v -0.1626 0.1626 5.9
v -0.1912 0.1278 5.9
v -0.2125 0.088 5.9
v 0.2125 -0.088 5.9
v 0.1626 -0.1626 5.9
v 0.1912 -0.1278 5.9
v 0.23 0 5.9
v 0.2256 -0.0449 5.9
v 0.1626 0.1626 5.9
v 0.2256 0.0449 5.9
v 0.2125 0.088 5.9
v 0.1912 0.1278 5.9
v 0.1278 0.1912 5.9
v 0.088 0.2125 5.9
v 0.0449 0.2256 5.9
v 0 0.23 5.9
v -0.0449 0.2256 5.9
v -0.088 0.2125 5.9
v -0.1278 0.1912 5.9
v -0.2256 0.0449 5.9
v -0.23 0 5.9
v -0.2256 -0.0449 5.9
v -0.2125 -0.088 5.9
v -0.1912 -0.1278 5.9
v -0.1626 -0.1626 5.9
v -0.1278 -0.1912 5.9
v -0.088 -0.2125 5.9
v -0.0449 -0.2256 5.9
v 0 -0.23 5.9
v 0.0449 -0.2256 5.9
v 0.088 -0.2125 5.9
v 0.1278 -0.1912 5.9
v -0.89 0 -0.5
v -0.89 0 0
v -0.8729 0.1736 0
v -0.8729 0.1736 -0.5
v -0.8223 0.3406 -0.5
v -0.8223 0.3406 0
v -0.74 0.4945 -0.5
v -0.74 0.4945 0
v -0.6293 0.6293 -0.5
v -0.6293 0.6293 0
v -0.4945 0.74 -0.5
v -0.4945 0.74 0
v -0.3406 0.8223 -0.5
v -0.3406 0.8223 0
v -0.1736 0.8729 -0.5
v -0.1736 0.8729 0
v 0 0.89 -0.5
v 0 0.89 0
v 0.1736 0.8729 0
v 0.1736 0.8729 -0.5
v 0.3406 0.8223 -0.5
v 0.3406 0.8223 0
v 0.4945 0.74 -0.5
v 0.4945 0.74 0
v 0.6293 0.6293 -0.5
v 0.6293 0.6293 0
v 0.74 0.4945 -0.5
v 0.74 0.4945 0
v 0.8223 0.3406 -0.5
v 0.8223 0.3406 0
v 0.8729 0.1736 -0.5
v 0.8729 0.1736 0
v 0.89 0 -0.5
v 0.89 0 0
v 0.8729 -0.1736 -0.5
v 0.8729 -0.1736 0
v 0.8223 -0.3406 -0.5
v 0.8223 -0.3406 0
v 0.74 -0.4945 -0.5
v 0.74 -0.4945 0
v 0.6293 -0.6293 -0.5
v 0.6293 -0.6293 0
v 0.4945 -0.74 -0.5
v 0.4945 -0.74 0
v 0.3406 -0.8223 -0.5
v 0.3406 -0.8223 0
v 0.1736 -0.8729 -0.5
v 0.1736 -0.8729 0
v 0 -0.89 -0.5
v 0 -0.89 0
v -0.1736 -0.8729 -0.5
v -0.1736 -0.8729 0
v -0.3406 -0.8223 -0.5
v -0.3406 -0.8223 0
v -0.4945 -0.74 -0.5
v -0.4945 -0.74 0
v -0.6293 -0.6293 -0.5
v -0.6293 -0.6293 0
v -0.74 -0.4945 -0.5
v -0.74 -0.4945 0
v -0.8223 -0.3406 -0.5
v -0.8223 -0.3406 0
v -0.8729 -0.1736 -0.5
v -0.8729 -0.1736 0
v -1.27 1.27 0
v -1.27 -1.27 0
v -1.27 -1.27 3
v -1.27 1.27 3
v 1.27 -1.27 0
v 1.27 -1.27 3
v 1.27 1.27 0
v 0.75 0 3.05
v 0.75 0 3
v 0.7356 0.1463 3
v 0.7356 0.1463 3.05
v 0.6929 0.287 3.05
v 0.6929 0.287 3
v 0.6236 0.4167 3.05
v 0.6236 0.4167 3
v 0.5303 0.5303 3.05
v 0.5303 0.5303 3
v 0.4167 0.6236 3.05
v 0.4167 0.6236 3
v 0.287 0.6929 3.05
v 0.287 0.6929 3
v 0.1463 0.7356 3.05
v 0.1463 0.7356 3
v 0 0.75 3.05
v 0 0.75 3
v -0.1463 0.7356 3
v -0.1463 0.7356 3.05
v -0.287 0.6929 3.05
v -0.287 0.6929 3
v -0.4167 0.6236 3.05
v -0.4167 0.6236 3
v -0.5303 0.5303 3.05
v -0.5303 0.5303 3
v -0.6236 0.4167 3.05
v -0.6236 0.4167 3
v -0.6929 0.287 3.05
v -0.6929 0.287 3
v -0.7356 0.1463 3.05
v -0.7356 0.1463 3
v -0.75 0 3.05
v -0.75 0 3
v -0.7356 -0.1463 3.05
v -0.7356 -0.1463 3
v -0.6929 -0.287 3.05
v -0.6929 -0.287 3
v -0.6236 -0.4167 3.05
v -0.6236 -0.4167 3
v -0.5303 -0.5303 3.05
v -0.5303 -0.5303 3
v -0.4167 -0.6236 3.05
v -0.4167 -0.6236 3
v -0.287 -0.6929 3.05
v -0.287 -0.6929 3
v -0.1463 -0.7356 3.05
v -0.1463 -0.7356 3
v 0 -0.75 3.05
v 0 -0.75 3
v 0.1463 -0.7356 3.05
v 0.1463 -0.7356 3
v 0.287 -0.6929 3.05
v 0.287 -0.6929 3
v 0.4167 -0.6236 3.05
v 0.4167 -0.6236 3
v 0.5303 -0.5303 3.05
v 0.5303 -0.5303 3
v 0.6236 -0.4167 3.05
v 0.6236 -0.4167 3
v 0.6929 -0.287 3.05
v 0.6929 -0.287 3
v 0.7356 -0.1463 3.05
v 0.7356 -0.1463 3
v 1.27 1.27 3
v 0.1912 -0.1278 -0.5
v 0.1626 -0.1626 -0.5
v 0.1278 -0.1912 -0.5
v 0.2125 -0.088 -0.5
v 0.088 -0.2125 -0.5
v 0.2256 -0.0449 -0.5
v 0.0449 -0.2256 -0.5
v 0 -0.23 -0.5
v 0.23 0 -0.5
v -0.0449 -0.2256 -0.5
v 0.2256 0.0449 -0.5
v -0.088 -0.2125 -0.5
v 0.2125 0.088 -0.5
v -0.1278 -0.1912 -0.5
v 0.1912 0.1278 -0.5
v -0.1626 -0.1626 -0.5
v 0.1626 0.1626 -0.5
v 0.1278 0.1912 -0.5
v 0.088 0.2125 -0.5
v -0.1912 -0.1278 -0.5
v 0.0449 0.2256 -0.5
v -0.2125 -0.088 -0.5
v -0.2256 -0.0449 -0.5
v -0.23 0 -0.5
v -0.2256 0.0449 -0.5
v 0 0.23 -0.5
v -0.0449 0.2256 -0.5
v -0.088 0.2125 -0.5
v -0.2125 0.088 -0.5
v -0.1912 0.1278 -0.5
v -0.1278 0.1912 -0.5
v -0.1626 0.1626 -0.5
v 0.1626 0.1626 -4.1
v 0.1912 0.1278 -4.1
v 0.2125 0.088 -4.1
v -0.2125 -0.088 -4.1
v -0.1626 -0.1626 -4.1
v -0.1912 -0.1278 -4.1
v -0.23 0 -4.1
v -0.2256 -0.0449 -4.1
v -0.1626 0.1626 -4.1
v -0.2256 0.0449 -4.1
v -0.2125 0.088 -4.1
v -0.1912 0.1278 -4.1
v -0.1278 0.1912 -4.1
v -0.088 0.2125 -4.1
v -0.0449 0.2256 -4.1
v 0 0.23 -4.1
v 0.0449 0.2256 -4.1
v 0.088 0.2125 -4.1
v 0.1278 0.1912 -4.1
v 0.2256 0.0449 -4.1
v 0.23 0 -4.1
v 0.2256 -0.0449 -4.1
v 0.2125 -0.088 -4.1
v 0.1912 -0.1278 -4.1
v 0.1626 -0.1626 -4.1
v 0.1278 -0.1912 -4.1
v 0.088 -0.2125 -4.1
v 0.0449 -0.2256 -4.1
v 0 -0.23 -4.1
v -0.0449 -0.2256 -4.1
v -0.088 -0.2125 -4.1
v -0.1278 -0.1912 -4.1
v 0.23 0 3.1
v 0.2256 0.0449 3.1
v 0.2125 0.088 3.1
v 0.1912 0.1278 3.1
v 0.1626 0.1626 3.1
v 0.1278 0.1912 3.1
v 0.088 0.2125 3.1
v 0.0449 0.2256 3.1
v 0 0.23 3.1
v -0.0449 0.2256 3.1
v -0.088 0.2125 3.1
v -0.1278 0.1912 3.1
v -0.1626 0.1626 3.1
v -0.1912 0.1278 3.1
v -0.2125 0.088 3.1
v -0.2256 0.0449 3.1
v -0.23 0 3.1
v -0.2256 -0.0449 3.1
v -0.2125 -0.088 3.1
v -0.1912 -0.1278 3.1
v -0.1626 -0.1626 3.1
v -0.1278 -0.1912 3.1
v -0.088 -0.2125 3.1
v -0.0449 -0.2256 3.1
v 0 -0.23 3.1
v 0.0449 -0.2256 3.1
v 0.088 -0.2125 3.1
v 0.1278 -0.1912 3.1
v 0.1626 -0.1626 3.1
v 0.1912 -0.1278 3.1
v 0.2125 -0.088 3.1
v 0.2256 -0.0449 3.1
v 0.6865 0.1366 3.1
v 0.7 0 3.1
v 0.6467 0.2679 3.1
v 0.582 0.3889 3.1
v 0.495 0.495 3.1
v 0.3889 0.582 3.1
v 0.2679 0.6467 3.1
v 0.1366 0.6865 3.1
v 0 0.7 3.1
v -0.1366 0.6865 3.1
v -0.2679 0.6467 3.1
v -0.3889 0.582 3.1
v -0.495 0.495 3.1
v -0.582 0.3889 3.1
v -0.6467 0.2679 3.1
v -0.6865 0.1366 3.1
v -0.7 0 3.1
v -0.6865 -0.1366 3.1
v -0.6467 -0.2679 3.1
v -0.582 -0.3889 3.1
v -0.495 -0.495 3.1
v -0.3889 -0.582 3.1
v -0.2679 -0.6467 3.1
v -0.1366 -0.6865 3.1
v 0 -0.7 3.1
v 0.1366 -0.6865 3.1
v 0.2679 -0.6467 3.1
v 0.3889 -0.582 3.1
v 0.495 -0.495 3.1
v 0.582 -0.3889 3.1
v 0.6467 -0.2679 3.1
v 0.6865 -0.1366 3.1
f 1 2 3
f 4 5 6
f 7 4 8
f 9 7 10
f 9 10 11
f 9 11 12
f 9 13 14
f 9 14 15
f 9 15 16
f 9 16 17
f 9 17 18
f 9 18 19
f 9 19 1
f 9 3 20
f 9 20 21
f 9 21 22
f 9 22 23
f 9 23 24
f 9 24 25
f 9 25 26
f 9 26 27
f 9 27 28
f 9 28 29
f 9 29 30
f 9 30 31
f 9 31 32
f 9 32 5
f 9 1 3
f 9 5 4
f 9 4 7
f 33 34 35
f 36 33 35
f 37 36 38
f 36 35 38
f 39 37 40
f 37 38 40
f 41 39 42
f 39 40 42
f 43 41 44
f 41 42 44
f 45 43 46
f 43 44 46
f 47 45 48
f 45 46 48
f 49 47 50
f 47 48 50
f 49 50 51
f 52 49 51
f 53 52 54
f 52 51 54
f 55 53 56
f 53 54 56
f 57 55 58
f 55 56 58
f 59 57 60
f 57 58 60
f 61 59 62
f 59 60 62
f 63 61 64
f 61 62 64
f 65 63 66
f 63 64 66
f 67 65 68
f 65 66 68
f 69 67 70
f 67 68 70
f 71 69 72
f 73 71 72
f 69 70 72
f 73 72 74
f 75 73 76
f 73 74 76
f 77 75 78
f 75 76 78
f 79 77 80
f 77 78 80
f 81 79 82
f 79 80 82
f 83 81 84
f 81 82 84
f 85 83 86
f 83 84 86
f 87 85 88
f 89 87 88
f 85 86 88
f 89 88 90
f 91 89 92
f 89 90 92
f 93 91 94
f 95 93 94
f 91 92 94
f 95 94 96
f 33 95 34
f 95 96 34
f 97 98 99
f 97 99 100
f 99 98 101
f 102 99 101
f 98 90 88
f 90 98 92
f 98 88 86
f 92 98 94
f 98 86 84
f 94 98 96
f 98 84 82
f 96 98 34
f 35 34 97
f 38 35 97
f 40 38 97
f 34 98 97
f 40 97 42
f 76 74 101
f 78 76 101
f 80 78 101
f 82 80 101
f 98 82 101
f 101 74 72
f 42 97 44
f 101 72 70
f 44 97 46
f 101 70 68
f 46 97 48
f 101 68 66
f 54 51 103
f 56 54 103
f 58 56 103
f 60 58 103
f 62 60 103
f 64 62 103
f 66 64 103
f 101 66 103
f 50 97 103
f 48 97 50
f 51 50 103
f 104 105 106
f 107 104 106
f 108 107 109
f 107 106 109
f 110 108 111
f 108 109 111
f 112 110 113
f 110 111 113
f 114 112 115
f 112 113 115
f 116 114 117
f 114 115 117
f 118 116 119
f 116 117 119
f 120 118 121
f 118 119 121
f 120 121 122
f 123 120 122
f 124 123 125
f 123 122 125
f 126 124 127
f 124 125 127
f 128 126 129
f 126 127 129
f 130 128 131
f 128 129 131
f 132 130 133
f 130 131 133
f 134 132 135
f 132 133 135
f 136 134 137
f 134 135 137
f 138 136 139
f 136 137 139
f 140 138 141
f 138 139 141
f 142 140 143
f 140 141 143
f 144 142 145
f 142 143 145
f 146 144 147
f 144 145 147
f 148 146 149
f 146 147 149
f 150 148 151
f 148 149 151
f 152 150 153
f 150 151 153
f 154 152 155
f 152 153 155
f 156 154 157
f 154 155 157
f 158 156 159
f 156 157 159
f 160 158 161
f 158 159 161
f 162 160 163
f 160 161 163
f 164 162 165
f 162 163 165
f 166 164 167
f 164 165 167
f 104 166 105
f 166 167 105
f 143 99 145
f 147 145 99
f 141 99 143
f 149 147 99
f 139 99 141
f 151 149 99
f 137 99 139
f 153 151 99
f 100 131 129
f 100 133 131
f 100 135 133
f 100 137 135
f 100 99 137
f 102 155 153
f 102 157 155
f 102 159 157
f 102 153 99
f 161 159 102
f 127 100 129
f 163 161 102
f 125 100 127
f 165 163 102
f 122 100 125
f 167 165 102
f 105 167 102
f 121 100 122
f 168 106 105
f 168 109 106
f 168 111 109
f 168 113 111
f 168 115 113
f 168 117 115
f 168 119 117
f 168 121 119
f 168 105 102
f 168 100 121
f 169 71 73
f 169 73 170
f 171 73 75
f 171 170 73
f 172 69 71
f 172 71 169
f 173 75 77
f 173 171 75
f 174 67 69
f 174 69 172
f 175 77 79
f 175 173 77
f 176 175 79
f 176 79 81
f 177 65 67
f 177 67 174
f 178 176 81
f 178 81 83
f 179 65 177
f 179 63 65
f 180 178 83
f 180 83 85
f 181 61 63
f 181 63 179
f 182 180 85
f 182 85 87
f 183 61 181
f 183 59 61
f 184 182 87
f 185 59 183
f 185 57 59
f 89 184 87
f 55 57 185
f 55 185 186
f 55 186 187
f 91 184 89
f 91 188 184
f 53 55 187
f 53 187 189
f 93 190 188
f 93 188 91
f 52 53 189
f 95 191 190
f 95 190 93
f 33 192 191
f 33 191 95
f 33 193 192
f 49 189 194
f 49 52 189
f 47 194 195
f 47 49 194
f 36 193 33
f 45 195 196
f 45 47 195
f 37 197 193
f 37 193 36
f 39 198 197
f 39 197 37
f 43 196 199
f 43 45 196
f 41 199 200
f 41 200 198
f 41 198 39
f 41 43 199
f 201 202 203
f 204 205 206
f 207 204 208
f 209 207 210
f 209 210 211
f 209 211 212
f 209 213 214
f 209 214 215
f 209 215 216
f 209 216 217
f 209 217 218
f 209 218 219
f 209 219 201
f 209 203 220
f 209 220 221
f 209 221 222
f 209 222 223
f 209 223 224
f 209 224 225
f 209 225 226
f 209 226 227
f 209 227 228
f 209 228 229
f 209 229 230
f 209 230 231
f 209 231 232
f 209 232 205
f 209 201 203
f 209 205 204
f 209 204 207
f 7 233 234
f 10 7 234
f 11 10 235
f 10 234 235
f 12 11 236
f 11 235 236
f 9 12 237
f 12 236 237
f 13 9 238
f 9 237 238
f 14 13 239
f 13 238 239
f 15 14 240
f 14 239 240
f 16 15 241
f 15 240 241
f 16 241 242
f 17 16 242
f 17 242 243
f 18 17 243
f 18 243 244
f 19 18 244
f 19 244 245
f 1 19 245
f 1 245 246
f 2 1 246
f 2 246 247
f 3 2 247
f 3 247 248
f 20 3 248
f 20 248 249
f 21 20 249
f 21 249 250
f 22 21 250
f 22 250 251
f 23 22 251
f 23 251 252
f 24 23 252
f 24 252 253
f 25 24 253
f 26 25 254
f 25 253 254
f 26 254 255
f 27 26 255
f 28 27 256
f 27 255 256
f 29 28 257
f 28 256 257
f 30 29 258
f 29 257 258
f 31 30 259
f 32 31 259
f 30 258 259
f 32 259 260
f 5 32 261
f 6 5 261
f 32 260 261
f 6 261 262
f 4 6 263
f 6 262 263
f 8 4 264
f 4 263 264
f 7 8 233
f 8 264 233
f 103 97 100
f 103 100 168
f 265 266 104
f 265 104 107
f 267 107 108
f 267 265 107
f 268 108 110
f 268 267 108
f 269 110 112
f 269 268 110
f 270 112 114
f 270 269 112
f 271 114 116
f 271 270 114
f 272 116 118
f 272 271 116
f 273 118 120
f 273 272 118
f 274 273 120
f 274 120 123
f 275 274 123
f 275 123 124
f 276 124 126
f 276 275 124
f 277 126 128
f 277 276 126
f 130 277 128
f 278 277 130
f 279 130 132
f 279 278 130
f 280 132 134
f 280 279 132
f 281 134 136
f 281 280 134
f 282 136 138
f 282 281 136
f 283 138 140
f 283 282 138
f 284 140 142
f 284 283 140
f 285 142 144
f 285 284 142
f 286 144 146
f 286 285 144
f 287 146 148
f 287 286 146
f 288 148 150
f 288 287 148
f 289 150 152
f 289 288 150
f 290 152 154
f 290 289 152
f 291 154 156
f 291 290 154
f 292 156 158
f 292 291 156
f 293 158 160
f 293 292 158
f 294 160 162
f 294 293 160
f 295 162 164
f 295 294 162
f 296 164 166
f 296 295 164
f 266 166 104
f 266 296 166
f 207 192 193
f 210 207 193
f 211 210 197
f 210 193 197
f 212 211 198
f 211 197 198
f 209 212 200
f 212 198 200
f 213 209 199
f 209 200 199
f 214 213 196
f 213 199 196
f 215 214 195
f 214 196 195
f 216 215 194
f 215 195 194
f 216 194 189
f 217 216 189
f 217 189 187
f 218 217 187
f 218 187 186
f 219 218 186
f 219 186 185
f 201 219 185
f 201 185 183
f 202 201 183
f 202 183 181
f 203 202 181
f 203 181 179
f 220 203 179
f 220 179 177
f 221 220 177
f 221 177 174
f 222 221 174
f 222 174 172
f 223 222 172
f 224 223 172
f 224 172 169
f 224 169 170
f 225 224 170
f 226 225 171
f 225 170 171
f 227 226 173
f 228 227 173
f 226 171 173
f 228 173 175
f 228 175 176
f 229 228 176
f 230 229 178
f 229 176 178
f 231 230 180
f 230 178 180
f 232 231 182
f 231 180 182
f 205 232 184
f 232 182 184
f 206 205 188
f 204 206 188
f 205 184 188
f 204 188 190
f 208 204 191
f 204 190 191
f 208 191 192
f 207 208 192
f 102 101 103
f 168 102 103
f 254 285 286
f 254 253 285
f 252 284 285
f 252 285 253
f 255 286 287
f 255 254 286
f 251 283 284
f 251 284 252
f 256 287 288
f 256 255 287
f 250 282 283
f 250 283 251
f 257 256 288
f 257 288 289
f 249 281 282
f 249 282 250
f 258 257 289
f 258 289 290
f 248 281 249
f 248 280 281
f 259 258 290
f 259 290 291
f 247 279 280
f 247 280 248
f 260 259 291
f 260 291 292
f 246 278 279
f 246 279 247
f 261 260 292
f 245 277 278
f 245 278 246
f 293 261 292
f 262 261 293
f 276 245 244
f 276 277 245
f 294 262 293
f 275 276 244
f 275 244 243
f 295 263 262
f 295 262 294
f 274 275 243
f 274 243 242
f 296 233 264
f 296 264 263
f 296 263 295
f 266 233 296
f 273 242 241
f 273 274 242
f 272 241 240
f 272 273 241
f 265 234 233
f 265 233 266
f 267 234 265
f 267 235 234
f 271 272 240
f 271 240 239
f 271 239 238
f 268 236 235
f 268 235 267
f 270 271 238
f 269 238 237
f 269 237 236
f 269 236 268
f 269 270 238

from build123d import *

# Parameters (mm, degrees)
SKETCH1_W           = 2.54
SKETCH1_H           = 2.54
BOSS_EXTRUDE1_DEPTH = 3
SKETCH2_R           = 0.23
BOSS_EXTRUDE2_DEPTH = 4.1
SKETCH3_R           = 0.89
BOSS_EXTRUDE3_DEPTH = 0.5
SKETCH4_R           = 0.23
BOSS_EXTRUDE4_DEPTH = 2.9
SKETCH5_R           = 0.75
BOSS_EXTRUDE5_DEPTH = 0.1
CHAMFER1_SIZE       = 0.05


with BuildPart() as part:
    # Sketch1 → Boss-Extrude1 (new body)
    with BuildSketch(Plane.XY):
        Rectangle(SKETCH1_W, SKETCH1_H)
    extrude(amount=BOSS_EXTRUDE1_DEPTH)

    # Sketch2 → Boss-Extrude2 (add)
    with BuildSketch(Plane(origin=(0, 0, 0), x_dir=(-1, 0, 0), z_dir=(0, 0, -1))):
        Circle(SKETCH2_R)
    extrude(amount=BOSS_EXTRUDE2_DEPTH)

    # Sketch3 → Boss-Extrude3 (add)
    with BuildSketch(Plane(origin=(0, 0, 0), x_dir=(-1, 0, 0), z_dir=(0, 0, -1))):
        Circle(SKETCH3_R)
    extrude(amount=BOSS_EXTRUDE3_DEPTH)

    # Sketch4 → Boss-Extrude4 (add)
    with BuildSketch(Plane.XY.offset(3)):
        Circle(SKETCH4_R)
    extrude(amount=BOSS_EXTRUDE4_DEPTH)

    # Sketch5 → Boss-Extrude5 (add)
    with BuildSketch(Plane.XY.offset(3)):
        Circle(SKETCH5_R)
    extrude(amount=BOSS_EXTRUDE5_DEPTH)

    # Chamfer1
    chamfer1_edges = [part.edges().sort_by_distance(p)[0] for p in [
        (-0.75, 0, 3.1),
    ]]
    chamfer(chamfer1_edges, length=CHAMFER1_SIZE)


solid = part.part
